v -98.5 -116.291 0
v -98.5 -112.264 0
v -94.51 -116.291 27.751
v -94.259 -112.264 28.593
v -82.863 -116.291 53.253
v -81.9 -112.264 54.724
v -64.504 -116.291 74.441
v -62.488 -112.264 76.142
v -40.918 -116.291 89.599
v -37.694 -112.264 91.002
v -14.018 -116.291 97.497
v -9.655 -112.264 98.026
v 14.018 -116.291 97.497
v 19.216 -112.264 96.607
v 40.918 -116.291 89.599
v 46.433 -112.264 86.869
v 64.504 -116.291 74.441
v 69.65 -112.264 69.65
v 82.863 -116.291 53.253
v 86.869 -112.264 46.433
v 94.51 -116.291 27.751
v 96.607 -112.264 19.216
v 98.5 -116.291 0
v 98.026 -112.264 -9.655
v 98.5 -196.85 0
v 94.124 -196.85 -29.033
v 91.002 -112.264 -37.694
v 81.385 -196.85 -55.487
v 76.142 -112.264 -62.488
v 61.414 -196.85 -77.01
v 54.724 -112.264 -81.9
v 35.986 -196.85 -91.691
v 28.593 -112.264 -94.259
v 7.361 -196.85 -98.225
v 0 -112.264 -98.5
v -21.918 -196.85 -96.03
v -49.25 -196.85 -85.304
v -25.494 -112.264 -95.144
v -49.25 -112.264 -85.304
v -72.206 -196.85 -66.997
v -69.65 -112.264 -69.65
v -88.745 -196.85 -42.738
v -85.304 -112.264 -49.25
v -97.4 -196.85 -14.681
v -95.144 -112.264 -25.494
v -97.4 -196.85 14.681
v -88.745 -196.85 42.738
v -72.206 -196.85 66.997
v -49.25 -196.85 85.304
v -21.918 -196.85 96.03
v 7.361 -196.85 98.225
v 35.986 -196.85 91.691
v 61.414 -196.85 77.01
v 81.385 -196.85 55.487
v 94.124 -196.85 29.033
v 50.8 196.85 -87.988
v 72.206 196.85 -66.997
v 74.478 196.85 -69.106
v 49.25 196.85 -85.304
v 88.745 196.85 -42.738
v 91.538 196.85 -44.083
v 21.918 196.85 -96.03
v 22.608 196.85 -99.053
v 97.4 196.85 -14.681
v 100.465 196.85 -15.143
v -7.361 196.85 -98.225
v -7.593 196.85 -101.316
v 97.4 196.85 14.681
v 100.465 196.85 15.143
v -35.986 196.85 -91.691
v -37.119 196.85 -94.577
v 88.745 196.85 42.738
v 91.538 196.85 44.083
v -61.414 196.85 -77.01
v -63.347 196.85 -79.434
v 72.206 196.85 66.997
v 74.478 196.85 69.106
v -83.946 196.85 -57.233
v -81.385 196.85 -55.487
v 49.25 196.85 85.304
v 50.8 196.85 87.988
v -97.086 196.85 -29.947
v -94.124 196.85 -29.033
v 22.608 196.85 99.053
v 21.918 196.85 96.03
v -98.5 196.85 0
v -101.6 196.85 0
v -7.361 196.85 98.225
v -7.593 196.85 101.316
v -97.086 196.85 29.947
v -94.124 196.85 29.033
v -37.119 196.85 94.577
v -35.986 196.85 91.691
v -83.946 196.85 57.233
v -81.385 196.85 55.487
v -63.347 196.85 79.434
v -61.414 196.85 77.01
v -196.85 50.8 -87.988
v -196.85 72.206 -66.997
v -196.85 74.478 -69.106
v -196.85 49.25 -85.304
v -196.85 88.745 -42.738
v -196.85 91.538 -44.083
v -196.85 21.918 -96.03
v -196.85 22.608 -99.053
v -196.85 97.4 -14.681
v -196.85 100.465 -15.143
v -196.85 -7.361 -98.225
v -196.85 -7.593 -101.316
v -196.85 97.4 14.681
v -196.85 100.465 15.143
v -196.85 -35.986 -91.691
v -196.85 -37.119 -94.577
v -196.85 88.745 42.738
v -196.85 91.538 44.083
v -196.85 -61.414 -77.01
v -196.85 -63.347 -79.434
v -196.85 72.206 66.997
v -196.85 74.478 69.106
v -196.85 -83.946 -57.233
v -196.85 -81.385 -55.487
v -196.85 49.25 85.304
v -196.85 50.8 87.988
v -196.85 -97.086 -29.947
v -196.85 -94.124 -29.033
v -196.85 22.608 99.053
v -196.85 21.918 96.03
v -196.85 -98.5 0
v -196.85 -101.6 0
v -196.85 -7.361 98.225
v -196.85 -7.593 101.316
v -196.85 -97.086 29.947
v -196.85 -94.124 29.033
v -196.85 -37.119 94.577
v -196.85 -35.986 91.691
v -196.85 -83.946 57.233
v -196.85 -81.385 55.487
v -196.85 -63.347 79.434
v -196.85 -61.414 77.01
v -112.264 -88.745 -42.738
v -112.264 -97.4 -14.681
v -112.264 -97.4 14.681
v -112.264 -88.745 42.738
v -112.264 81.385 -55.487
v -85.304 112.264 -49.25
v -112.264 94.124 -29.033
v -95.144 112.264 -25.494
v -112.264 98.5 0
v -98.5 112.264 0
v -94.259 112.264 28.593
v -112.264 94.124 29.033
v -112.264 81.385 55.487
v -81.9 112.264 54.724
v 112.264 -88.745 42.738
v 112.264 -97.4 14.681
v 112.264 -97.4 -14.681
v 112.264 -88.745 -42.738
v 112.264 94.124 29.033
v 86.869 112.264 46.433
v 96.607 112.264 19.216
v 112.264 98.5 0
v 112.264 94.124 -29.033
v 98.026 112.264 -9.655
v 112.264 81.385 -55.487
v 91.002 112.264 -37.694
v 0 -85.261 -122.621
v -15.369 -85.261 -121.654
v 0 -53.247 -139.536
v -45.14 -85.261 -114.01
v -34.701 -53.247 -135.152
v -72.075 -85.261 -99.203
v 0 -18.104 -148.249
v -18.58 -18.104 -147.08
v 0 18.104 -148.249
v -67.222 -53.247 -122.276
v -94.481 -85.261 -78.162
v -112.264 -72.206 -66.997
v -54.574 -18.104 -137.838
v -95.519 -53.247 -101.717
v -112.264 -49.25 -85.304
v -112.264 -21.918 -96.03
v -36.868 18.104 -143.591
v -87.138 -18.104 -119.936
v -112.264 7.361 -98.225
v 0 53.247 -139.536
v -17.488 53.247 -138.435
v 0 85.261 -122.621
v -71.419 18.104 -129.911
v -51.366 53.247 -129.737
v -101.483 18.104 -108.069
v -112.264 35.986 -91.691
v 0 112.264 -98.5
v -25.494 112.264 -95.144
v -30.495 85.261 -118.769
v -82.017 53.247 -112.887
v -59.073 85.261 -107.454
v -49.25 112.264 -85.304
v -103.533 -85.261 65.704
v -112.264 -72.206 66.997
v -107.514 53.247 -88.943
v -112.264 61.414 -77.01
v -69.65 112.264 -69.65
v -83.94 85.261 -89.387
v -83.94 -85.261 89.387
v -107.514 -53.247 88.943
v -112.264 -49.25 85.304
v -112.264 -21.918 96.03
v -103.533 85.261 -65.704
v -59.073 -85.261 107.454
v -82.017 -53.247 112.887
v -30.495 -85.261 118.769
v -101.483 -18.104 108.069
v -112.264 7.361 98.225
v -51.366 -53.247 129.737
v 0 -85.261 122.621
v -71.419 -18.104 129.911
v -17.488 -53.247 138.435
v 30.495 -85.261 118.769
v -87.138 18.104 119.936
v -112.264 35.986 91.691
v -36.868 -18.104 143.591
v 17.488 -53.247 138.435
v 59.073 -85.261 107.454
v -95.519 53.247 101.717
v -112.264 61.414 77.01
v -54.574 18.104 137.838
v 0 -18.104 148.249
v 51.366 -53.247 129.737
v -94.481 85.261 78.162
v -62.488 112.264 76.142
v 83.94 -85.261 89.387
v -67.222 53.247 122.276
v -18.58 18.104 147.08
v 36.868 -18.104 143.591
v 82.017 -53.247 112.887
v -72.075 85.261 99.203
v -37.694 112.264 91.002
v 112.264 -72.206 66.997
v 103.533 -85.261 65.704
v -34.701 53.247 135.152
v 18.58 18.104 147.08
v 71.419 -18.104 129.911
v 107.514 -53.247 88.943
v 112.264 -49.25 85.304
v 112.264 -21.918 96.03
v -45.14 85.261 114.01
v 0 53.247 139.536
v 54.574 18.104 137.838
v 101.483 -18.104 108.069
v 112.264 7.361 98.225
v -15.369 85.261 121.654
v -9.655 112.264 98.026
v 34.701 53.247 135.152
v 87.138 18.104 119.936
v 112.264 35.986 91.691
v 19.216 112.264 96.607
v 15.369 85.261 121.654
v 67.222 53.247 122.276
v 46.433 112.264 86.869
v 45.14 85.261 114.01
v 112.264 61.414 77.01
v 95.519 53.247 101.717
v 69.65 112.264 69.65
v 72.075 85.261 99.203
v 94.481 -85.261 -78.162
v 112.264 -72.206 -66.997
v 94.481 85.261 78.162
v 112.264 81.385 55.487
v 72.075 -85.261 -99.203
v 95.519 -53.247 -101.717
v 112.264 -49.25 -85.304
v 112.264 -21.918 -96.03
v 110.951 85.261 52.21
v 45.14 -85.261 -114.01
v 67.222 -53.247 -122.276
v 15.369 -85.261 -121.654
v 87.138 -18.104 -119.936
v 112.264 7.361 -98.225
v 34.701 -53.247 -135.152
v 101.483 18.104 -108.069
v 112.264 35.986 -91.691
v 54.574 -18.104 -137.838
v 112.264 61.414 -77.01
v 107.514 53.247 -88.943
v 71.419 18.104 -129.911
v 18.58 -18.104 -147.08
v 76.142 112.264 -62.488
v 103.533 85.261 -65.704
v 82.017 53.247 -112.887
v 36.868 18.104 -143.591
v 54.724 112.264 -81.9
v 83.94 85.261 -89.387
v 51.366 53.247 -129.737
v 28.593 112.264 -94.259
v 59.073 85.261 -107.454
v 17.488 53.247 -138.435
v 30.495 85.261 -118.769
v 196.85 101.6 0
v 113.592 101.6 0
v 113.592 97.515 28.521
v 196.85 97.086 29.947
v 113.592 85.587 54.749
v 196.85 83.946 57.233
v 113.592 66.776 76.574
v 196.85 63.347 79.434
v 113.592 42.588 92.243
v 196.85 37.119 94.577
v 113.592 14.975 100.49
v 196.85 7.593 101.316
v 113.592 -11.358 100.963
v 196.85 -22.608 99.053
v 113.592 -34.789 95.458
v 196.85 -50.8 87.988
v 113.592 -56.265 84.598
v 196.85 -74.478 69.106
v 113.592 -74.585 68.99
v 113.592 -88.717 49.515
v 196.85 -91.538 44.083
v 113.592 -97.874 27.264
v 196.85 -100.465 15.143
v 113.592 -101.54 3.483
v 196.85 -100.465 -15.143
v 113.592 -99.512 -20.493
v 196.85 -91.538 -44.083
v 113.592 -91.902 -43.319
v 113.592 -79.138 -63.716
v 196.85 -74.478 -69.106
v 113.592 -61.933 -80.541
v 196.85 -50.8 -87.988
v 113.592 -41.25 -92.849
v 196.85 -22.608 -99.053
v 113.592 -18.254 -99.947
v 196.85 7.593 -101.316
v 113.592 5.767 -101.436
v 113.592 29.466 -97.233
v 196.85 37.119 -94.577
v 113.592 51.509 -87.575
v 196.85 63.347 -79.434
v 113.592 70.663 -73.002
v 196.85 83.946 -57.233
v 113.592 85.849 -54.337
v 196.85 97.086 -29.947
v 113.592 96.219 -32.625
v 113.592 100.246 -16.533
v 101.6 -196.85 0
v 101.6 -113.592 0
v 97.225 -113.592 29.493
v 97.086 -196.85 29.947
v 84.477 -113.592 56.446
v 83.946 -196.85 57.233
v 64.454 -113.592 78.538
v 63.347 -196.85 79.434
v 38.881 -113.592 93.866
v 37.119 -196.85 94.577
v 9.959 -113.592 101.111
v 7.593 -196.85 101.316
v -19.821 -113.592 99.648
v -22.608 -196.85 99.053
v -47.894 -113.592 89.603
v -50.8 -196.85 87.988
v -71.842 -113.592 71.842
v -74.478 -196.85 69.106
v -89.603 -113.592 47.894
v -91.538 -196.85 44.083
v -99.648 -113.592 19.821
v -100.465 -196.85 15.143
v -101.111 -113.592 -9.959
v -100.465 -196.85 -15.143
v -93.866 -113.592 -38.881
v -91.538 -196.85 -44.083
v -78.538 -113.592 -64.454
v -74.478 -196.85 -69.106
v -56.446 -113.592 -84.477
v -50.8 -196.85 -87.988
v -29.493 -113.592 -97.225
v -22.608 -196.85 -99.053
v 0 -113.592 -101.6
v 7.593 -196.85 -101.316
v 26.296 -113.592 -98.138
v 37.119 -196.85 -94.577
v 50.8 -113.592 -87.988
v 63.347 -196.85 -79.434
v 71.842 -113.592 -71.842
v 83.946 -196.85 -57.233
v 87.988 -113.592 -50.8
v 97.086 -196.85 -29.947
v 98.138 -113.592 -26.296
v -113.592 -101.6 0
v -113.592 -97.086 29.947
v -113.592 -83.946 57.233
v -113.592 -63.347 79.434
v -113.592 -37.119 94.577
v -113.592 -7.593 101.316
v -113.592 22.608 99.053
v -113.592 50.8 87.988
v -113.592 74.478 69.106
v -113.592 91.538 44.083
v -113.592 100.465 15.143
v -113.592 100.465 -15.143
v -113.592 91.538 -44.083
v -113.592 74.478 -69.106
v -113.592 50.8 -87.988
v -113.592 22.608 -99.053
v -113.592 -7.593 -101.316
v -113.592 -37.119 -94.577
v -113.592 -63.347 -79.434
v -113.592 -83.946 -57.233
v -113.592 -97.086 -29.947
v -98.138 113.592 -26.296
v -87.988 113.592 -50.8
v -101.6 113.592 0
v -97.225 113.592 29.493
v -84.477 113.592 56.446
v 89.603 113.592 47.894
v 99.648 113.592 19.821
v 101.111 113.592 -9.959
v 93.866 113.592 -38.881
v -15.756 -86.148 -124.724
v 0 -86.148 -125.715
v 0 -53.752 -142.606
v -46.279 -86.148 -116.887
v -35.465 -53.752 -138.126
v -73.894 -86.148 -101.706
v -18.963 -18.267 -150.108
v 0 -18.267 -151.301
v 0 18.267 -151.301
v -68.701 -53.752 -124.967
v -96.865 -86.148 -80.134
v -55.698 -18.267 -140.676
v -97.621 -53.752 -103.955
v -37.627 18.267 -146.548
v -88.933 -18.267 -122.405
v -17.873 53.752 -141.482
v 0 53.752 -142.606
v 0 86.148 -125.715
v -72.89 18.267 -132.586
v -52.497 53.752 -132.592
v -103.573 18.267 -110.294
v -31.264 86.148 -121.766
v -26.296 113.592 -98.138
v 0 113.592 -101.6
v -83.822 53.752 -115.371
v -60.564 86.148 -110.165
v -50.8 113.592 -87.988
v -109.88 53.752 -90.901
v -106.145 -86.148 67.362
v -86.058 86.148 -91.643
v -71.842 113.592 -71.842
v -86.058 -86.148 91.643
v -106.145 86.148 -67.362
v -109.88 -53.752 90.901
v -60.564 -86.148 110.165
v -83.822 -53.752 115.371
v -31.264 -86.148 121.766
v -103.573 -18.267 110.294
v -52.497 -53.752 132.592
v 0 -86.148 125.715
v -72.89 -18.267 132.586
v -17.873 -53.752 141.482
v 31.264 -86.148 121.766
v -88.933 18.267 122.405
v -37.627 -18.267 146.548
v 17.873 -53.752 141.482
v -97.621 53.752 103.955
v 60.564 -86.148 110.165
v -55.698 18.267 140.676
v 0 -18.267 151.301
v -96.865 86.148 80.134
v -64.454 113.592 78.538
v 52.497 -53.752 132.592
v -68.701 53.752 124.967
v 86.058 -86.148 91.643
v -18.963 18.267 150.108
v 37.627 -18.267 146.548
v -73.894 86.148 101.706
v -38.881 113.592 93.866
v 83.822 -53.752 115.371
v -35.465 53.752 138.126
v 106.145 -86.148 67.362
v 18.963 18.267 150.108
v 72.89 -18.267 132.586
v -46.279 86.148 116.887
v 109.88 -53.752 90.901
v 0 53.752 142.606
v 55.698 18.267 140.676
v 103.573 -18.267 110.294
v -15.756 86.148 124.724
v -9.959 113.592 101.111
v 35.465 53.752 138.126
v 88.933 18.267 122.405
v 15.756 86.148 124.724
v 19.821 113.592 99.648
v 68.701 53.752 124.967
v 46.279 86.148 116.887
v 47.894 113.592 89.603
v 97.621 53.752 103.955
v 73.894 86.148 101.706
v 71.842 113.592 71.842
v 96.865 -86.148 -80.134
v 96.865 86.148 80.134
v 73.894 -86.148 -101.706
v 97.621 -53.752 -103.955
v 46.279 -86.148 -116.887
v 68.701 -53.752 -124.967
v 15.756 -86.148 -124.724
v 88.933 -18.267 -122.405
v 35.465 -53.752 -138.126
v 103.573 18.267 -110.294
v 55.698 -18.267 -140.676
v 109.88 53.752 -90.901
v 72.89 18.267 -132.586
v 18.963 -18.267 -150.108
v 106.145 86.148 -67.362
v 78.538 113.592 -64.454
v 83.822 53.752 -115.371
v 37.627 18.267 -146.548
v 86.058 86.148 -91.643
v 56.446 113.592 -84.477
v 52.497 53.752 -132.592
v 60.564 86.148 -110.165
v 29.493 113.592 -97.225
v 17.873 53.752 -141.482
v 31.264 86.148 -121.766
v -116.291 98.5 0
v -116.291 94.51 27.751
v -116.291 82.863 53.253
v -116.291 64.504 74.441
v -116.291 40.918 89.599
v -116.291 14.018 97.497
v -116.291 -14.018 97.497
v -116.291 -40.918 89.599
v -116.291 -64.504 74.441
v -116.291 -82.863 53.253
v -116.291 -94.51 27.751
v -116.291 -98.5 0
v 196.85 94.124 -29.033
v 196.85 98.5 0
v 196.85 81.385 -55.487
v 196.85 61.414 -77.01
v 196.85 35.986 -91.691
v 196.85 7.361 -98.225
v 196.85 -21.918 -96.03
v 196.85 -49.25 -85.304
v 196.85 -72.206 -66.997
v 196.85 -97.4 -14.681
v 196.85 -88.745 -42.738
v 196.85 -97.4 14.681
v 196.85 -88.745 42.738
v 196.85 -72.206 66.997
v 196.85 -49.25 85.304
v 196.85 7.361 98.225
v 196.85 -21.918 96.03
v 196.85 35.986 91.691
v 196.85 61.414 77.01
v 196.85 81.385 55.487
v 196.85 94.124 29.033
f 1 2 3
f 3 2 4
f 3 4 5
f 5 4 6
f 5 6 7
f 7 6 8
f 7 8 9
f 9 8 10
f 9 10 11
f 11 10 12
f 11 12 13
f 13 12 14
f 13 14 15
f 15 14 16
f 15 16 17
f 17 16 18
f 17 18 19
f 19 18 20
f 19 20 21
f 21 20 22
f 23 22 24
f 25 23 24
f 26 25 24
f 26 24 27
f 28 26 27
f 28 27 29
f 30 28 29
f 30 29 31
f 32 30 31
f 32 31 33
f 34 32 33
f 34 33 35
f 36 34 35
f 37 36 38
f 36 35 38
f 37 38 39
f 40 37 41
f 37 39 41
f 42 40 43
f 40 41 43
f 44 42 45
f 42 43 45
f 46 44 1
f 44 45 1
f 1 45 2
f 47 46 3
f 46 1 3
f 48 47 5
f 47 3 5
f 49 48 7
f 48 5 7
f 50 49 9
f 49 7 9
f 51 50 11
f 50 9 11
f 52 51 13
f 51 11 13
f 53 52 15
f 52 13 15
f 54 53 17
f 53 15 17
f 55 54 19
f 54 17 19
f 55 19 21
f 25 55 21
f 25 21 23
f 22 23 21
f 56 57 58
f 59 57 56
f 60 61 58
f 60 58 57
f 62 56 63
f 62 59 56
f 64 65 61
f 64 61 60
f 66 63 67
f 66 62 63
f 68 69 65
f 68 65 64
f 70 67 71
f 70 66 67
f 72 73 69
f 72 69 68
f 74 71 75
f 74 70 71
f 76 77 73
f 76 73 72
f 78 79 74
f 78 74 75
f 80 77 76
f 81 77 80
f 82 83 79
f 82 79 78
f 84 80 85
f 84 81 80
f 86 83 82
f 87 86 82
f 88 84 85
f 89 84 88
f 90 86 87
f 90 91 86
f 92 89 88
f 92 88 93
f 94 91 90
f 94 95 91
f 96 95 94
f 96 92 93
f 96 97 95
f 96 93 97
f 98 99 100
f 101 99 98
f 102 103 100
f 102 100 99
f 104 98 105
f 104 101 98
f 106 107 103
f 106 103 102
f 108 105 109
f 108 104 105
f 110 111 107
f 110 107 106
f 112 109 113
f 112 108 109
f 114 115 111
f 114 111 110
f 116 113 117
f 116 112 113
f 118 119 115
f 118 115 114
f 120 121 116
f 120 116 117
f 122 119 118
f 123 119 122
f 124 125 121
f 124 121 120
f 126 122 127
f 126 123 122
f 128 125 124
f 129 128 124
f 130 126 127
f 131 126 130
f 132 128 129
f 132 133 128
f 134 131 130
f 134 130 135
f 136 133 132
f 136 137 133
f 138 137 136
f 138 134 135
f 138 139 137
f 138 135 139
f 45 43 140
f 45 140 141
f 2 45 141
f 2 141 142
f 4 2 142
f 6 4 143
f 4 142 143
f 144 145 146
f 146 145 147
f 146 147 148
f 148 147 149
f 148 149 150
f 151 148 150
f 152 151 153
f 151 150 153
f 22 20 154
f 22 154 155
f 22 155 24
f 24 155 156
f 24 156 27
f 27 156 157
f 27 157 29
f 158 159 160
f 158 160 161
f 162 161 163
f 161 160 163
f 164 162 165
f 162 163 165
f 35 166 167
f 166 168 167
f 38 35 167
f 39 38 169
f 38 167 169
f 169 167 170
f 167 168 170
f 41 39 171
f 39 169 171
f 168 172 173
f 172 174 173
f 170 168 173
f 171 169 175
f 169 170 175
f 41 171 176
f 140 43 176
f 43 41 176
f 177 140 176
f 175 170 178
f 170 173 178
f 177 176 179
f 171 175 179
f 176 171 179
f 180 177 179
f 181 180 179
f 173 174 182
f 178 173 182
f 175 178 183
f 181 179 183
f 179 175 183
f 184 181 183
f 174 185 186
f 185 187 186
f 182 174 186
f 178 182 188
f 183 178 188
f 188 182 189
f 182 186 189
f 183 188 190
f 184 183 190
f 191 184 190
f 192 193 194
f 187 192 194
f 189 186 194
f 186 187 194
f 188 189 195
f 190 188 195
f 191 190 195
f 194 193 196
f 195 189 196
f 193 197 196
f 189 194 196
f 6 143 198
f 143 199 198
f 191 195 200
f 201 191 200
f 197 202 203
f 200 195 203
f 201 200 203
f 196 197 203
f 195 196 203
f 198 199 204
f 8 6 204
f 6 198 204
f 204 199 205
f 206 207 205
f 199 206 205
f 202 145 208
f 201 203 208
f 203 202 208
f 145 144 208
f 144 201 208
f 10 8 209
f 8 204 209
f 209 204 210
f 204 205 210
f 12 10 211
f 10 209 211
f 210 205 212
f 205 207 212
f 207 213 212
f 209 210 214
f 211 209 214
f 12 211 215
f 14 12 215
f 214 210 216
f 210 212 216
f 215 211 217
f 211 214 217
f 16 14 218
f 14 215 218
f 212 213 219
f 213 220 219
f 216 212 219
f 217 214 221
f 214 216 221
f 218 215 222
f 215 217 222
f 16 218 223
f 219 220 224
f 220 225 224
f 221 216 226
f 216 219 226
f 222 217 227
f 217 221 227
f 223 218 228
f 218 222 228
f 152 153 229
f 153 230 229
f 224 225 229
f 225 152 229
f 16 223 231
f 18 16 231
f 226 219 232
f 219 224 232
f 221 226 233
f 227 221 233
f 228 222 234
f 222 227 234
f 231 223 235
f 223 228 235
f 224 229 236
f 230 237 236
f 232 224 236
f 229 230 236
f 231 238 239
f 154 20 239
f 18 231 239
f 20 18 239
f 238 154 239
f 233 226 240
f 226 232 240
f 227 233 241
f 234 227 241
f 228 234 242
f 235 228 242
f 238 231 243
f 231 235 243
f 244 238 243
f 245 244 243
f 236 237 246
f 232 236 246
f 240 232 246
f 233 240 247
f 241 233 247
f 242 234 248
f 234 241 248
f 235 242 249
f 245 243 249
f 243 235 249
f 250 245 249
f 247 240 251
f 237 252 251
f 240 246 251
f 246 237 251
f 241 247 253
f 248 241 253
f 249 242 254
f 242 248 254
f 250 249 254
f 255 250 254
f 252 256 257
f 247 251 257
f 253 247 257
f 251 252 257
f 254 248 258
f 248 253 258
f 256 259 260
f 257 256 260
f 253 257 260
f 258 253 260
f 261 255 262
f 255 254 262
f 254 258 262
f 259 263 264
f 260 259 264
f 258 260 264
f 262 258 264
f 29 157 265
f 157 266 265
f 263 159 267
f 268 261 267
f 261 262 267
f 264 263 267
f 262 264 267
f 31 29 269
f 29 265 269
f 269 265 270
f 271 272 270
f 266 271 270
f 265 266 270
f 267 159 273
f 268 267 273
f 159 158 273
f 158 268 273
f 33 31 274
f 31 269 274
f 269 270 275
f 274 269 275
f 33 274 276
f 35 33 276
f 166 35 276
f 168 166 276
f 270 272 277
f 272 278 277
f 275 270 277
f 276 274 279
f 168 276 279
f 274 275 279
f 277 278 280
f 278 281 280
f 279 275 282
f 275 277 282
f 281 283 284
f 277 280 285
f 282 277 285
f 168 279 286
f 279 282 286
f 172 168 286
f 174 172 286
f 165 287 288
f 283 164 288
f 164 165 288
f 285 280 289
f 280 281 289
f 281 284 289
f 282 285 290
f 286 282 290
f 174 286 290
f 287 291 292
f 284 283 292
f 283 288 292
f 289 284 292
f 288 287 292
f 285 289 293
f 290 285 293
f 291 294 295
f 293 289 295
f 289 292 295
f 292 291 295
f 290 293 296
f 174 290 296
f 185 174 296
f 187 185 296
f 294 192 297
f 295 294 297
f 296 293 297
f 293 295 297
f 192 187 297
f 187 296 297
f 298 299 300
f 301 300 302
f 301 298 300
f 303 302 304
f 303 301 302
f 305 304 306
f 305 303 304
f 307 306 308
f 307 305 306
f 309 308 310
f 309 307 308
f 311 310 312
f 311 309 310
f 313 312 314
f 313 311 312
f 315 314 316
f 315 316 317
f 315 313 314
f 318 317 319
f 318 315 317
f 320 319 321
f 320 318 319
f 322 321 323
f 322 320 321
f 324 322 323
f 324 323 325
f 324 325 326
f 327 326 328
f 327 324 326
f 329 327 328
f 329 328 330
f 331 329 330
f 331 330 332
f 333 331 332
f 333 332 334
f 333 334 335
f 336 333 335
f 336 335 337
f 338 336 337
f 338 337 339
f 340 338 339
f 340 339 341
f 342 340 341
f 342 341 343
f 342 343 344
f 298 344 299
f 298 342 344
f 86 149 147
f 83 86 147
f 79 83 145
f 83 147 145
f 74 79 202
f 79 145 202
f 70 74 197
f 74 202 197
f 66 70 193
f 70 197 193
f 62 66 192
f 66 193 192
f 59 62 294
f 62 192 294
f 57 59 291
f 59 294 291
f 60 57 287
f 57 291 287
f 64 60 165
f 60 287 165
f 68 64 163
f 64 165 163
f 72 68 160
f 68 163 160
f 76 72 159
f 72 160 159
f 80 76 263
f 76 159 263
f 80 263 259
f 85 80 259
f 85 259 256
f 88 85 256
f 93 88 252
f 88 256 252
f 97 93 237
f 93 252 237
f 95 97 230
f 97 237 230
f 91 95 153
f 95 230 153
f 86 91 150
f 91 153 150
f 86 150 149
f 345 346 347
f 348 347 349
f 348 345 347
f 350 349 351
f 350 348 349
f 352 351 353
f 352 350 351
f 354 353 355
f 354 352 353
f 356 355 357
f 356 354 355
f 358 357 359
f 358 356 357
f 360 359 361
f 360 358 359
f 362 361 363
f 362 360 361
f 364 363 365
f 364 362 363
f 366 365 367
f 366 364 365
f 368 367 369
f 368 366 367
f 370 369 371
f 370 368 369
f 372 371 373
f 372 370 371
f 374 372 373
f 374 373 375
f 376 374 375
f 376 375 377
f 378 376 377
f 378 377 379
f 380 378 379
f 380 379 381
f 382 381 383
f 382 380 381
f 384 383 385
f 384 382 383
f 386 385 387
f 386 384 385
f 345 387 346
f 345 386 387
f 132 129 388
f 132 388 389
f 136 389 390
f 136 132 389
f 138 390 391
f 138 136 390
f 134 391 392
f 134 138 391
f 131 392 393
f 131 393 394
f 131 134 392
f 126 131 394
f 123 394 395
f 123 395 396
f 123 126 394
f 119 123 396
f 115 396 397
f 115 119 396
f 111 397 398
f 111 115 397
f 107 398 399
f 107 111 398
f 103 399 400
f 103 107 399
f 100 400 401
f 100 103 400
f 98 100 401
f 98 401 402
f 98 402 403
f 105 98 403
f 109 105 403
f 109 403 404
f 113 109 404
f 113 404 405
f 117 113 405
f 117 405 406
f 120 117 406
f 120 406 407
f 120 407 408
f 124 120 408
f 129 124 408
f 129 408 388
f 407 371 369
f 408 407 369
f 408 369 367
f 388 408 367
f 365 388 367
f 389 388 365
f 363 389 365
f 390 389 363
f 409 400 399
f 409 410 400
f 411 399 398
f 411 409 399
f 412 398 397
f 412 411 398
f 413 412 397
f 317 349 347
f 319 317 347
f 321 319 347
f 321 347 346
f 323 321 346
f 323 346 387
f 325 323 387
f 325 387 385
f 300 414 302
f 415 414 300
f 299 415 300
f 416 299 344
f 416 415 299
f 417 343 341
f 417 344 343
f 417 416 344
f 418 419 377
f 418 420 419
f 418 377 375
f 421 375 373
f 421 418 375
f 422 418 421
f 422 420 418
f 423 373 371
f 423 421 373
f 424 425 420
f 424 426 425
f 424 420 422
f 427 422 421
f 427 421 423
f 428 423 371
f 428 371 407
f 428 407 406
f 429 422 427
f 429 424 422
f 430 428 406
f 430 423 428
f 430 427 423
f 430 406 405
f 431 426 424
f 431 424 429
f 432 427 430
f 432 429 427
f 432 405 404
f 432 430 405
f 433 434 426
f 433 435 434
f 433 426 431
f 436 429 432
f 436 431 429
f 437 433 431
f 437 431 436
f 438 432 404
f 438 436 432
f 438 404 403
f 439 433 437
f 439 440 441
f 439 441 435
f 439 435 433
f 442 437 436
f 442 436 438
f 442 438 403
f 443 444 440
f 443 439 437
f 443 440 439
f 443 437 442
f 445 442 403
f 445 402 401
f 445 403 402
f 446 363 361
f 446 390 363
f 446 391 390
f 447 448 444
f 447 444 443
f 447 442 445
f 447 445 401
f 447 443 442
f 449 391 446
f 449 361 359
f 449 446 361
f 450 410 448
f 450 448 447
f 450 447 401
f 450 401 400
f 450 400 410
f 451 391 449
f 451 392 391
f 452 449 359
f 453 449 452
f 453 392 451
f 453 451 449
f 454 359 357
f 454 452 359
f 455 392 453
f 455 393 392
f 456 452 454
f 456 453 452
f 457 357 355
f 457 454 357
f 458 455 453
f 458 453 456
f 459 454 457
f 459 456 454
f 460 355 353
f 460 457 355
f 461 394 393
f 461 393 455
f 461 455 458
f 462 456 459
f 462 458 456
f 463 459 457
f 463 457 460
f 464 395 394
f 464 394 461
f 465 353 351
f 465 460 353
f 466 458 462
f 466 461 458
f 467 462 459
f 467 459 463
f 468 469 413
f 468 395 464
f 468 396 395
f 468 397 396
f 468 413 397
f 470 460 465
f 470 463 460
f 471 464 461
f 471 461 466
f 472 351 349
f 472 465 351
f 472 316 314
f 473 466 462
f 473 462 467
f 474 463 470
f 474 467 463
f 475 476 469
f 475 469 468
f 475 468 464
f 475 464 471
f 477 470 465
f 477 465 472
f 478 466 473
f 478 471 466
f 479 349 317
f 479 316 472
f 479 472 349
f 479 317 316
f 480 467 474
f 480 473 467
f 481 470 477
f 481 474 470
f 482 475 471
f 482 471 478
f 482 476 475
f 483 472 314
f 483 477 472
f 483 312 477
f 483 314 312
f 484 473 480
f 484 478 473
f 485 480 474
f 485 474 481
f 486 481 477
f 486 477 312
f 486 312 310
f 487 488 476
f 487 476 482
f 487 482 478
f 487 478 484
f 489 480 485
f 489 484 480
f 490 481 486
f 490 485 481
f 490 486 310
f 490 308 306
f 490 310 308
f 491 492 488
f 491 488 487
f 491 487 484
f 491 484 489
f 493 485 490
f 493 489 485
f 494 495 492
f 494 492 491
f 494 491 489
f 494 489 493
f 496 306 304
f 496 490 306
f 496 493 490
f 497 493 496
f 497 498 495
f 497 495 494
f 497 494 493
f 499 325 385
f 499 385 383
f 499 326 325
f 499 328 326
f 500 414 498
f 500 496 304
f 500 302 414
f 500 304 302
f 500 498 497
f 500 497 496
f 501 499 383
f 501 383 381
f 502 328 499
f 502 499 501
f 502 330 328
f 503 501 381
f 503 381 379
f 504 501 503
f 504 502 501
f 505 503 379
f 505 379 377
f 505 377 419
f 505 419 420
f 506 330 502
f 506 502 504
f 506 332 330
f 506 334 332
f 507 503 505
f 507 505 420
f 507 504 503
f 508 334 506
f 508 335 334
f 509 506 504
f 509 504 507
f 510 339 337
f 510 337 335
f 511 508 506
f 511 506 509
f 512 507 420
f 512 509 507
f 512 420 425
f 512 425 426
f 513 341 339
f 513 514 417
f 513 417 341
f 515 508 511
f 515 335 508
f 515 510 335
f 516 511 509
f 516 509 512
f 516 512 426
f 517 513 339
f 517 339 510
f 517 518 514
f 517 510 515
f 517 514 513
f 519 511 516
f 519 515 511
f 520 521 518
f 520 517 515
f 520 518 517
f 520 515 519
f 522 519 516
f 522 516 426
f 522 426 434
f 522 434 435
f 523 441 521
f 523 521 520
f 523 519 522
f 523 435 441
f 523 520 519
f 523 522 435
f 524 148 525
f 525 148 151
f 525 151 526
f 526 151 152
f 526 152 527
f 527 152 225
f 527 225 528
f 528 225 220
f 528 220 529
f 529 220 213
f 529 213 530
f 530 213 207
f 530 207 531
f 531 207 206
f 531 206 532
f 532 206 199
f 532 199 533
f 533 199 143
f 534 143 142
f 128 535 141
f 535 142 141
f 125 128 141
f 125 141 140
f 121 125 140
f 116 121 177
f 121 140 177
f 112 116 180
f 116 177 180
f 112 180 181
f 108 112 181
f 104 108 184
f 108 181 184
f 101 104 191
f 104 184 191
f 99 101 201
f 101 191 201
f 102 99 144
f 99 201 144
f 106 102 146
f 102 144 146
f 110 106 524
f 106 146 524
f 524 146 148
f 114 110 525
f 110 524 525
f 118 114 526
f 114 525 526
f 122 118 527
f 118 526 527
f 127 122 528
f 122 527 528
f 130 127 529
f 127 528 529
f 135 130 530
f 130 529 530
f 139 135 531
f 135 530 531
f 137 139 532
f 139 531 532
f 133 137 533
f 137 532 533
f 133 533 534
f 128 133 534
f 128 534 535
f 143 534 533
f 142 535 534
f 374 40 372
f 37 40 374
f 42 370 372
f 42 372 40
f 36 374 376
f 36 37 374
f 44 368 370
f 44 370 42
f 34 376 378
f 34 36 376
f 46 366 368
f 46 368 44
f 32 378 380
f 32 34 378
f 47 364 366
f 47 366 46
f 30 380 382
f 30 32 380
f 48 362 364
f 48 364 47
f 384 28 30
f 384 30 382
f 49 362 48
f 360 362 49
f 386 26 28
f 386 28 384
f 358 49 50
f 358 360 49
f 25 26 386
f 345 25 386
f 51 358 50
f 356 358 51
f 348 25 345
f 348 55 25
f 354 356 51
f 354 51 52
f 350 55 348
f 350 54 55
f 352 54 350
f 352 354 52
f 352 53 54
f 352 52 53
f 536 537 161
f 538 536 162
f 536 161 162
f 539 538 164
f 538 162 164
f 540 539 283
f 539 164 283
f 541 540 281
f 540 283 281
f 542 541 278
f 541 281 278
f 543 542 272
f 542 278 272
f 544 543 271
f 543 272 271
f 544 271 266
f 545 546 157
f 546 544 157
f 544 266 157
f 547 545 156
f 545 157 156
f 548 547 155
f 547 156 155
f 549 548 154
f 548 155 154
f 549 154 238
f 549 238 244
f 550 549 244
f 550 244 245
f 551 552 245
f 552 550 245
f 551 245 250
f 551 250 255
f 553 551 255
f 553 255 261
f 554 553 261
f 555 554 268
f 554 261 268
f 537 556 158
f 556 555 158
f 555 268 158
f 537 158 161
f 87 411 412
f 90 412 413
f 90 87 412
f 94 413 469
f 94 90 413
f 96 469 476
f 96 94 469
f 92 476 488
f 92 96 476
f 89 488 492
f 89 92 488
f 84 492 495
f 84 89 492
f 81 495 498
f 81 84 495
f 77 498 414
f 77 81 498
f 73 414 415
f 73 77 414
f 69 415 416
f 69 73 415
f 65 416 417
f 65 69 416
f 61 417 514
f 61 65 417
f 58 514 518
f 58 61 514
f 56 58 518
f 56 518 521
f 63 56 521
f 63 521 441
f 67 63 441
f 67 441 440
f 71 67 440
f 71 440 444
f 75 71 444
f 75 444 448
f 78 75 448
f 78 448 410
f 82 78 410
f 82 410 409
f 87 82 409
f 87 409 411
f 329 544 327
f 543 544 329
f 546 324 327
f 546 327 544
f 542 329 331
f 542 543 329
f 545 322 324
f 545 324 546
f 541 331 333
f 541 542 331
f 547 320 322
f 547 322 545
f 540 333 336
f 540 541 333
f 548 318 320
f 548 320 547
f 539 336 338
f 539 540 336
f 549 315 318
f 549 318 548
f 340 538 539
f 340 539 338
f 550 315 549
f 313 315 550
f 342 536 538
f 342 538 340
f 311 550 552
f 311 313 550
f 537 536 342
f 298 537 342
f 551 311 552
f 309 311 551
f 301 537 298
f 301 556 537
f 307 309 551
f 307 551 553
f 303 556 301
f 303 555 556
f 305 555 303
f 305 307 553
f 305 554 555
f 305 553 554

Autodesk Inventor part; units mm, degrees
ref_plane "YZ Plane" through (0, 0, 0) normal (1, 0, 0) x (0, 1, 0)
ref_plane "XY Plane" through (0, 0, 0) normal (0, 0, 1) x (1, 0, 0)
sketch "Sketch1" plane through (0, 0, 0) normal (1, 0, 0) x (0, 1, 0)
  arc A0 (-152.4, 0) -> (152.4, 0) centre (0, 0) ccw
  arc A1 (-149.35, 0) -> (149.35, 0) centre (0, 0) ccw
  line L0 (152.4, 0) -> (149.35, 0)
  line L1 (-149.35, 0) -> (-152.4, 0)
  line L2 (-213.36, 0) -> (213.36, 0) projected
  dimension "d0" = 152.4
  dimension "d2" = 149.35
revolve "Revolution1" add sketch "Sketch1" angle 360 about axis through (0, -10, 0) along (0, 1, 0) contours L1 A1 L0 A0
sketch "Sketch2" plane through (0, 0, 0) normal (1, 0, 0) x (0, 1, 0)
  circle A0 centre (0, 0) radius 98.5
  dimension "d4" = 197
extrude "Extrusion1" cut sketch "Sketch2" along normal through all both and the other way through all
sketch "Sketch3" plane through (0, 0, 0) normal (0, 1, 0) x (-1, 0, 0)
  circle A0 centre (0, 0) radius 98.5
  dimension "d7" = 197
extrude "Extrusion2" cut sketch "Sketch3" along normal through all both and the other way through all
ref_plane "Work Plane1" through (0, 196.85, 0) normal (0, 1, 0) x (-1, 0, 0)
sketch "Sketch4" plane through (0, 196.85, 0) normal (0, 1, 0) x (-1, 0, 0)
  circle A0 centre (0, 0) radius 101.6
  circle A1 centre (0, 0) radius 98.5 projected
  circle A2 centre (0, 0) radius 98.5
  dimension "d11" = 203.2
  dimension "d12" = 197
extrude "Extrusion3" add sketch "Sketch4" against normal up to next
pattern_circular "Circular Pattern1" count 4 over 360 about axis through (0, 0, -10) along (0, 0, 1) of "Extrusion3"
properties part number "ISO_200_Cross_4way_Sphere"
